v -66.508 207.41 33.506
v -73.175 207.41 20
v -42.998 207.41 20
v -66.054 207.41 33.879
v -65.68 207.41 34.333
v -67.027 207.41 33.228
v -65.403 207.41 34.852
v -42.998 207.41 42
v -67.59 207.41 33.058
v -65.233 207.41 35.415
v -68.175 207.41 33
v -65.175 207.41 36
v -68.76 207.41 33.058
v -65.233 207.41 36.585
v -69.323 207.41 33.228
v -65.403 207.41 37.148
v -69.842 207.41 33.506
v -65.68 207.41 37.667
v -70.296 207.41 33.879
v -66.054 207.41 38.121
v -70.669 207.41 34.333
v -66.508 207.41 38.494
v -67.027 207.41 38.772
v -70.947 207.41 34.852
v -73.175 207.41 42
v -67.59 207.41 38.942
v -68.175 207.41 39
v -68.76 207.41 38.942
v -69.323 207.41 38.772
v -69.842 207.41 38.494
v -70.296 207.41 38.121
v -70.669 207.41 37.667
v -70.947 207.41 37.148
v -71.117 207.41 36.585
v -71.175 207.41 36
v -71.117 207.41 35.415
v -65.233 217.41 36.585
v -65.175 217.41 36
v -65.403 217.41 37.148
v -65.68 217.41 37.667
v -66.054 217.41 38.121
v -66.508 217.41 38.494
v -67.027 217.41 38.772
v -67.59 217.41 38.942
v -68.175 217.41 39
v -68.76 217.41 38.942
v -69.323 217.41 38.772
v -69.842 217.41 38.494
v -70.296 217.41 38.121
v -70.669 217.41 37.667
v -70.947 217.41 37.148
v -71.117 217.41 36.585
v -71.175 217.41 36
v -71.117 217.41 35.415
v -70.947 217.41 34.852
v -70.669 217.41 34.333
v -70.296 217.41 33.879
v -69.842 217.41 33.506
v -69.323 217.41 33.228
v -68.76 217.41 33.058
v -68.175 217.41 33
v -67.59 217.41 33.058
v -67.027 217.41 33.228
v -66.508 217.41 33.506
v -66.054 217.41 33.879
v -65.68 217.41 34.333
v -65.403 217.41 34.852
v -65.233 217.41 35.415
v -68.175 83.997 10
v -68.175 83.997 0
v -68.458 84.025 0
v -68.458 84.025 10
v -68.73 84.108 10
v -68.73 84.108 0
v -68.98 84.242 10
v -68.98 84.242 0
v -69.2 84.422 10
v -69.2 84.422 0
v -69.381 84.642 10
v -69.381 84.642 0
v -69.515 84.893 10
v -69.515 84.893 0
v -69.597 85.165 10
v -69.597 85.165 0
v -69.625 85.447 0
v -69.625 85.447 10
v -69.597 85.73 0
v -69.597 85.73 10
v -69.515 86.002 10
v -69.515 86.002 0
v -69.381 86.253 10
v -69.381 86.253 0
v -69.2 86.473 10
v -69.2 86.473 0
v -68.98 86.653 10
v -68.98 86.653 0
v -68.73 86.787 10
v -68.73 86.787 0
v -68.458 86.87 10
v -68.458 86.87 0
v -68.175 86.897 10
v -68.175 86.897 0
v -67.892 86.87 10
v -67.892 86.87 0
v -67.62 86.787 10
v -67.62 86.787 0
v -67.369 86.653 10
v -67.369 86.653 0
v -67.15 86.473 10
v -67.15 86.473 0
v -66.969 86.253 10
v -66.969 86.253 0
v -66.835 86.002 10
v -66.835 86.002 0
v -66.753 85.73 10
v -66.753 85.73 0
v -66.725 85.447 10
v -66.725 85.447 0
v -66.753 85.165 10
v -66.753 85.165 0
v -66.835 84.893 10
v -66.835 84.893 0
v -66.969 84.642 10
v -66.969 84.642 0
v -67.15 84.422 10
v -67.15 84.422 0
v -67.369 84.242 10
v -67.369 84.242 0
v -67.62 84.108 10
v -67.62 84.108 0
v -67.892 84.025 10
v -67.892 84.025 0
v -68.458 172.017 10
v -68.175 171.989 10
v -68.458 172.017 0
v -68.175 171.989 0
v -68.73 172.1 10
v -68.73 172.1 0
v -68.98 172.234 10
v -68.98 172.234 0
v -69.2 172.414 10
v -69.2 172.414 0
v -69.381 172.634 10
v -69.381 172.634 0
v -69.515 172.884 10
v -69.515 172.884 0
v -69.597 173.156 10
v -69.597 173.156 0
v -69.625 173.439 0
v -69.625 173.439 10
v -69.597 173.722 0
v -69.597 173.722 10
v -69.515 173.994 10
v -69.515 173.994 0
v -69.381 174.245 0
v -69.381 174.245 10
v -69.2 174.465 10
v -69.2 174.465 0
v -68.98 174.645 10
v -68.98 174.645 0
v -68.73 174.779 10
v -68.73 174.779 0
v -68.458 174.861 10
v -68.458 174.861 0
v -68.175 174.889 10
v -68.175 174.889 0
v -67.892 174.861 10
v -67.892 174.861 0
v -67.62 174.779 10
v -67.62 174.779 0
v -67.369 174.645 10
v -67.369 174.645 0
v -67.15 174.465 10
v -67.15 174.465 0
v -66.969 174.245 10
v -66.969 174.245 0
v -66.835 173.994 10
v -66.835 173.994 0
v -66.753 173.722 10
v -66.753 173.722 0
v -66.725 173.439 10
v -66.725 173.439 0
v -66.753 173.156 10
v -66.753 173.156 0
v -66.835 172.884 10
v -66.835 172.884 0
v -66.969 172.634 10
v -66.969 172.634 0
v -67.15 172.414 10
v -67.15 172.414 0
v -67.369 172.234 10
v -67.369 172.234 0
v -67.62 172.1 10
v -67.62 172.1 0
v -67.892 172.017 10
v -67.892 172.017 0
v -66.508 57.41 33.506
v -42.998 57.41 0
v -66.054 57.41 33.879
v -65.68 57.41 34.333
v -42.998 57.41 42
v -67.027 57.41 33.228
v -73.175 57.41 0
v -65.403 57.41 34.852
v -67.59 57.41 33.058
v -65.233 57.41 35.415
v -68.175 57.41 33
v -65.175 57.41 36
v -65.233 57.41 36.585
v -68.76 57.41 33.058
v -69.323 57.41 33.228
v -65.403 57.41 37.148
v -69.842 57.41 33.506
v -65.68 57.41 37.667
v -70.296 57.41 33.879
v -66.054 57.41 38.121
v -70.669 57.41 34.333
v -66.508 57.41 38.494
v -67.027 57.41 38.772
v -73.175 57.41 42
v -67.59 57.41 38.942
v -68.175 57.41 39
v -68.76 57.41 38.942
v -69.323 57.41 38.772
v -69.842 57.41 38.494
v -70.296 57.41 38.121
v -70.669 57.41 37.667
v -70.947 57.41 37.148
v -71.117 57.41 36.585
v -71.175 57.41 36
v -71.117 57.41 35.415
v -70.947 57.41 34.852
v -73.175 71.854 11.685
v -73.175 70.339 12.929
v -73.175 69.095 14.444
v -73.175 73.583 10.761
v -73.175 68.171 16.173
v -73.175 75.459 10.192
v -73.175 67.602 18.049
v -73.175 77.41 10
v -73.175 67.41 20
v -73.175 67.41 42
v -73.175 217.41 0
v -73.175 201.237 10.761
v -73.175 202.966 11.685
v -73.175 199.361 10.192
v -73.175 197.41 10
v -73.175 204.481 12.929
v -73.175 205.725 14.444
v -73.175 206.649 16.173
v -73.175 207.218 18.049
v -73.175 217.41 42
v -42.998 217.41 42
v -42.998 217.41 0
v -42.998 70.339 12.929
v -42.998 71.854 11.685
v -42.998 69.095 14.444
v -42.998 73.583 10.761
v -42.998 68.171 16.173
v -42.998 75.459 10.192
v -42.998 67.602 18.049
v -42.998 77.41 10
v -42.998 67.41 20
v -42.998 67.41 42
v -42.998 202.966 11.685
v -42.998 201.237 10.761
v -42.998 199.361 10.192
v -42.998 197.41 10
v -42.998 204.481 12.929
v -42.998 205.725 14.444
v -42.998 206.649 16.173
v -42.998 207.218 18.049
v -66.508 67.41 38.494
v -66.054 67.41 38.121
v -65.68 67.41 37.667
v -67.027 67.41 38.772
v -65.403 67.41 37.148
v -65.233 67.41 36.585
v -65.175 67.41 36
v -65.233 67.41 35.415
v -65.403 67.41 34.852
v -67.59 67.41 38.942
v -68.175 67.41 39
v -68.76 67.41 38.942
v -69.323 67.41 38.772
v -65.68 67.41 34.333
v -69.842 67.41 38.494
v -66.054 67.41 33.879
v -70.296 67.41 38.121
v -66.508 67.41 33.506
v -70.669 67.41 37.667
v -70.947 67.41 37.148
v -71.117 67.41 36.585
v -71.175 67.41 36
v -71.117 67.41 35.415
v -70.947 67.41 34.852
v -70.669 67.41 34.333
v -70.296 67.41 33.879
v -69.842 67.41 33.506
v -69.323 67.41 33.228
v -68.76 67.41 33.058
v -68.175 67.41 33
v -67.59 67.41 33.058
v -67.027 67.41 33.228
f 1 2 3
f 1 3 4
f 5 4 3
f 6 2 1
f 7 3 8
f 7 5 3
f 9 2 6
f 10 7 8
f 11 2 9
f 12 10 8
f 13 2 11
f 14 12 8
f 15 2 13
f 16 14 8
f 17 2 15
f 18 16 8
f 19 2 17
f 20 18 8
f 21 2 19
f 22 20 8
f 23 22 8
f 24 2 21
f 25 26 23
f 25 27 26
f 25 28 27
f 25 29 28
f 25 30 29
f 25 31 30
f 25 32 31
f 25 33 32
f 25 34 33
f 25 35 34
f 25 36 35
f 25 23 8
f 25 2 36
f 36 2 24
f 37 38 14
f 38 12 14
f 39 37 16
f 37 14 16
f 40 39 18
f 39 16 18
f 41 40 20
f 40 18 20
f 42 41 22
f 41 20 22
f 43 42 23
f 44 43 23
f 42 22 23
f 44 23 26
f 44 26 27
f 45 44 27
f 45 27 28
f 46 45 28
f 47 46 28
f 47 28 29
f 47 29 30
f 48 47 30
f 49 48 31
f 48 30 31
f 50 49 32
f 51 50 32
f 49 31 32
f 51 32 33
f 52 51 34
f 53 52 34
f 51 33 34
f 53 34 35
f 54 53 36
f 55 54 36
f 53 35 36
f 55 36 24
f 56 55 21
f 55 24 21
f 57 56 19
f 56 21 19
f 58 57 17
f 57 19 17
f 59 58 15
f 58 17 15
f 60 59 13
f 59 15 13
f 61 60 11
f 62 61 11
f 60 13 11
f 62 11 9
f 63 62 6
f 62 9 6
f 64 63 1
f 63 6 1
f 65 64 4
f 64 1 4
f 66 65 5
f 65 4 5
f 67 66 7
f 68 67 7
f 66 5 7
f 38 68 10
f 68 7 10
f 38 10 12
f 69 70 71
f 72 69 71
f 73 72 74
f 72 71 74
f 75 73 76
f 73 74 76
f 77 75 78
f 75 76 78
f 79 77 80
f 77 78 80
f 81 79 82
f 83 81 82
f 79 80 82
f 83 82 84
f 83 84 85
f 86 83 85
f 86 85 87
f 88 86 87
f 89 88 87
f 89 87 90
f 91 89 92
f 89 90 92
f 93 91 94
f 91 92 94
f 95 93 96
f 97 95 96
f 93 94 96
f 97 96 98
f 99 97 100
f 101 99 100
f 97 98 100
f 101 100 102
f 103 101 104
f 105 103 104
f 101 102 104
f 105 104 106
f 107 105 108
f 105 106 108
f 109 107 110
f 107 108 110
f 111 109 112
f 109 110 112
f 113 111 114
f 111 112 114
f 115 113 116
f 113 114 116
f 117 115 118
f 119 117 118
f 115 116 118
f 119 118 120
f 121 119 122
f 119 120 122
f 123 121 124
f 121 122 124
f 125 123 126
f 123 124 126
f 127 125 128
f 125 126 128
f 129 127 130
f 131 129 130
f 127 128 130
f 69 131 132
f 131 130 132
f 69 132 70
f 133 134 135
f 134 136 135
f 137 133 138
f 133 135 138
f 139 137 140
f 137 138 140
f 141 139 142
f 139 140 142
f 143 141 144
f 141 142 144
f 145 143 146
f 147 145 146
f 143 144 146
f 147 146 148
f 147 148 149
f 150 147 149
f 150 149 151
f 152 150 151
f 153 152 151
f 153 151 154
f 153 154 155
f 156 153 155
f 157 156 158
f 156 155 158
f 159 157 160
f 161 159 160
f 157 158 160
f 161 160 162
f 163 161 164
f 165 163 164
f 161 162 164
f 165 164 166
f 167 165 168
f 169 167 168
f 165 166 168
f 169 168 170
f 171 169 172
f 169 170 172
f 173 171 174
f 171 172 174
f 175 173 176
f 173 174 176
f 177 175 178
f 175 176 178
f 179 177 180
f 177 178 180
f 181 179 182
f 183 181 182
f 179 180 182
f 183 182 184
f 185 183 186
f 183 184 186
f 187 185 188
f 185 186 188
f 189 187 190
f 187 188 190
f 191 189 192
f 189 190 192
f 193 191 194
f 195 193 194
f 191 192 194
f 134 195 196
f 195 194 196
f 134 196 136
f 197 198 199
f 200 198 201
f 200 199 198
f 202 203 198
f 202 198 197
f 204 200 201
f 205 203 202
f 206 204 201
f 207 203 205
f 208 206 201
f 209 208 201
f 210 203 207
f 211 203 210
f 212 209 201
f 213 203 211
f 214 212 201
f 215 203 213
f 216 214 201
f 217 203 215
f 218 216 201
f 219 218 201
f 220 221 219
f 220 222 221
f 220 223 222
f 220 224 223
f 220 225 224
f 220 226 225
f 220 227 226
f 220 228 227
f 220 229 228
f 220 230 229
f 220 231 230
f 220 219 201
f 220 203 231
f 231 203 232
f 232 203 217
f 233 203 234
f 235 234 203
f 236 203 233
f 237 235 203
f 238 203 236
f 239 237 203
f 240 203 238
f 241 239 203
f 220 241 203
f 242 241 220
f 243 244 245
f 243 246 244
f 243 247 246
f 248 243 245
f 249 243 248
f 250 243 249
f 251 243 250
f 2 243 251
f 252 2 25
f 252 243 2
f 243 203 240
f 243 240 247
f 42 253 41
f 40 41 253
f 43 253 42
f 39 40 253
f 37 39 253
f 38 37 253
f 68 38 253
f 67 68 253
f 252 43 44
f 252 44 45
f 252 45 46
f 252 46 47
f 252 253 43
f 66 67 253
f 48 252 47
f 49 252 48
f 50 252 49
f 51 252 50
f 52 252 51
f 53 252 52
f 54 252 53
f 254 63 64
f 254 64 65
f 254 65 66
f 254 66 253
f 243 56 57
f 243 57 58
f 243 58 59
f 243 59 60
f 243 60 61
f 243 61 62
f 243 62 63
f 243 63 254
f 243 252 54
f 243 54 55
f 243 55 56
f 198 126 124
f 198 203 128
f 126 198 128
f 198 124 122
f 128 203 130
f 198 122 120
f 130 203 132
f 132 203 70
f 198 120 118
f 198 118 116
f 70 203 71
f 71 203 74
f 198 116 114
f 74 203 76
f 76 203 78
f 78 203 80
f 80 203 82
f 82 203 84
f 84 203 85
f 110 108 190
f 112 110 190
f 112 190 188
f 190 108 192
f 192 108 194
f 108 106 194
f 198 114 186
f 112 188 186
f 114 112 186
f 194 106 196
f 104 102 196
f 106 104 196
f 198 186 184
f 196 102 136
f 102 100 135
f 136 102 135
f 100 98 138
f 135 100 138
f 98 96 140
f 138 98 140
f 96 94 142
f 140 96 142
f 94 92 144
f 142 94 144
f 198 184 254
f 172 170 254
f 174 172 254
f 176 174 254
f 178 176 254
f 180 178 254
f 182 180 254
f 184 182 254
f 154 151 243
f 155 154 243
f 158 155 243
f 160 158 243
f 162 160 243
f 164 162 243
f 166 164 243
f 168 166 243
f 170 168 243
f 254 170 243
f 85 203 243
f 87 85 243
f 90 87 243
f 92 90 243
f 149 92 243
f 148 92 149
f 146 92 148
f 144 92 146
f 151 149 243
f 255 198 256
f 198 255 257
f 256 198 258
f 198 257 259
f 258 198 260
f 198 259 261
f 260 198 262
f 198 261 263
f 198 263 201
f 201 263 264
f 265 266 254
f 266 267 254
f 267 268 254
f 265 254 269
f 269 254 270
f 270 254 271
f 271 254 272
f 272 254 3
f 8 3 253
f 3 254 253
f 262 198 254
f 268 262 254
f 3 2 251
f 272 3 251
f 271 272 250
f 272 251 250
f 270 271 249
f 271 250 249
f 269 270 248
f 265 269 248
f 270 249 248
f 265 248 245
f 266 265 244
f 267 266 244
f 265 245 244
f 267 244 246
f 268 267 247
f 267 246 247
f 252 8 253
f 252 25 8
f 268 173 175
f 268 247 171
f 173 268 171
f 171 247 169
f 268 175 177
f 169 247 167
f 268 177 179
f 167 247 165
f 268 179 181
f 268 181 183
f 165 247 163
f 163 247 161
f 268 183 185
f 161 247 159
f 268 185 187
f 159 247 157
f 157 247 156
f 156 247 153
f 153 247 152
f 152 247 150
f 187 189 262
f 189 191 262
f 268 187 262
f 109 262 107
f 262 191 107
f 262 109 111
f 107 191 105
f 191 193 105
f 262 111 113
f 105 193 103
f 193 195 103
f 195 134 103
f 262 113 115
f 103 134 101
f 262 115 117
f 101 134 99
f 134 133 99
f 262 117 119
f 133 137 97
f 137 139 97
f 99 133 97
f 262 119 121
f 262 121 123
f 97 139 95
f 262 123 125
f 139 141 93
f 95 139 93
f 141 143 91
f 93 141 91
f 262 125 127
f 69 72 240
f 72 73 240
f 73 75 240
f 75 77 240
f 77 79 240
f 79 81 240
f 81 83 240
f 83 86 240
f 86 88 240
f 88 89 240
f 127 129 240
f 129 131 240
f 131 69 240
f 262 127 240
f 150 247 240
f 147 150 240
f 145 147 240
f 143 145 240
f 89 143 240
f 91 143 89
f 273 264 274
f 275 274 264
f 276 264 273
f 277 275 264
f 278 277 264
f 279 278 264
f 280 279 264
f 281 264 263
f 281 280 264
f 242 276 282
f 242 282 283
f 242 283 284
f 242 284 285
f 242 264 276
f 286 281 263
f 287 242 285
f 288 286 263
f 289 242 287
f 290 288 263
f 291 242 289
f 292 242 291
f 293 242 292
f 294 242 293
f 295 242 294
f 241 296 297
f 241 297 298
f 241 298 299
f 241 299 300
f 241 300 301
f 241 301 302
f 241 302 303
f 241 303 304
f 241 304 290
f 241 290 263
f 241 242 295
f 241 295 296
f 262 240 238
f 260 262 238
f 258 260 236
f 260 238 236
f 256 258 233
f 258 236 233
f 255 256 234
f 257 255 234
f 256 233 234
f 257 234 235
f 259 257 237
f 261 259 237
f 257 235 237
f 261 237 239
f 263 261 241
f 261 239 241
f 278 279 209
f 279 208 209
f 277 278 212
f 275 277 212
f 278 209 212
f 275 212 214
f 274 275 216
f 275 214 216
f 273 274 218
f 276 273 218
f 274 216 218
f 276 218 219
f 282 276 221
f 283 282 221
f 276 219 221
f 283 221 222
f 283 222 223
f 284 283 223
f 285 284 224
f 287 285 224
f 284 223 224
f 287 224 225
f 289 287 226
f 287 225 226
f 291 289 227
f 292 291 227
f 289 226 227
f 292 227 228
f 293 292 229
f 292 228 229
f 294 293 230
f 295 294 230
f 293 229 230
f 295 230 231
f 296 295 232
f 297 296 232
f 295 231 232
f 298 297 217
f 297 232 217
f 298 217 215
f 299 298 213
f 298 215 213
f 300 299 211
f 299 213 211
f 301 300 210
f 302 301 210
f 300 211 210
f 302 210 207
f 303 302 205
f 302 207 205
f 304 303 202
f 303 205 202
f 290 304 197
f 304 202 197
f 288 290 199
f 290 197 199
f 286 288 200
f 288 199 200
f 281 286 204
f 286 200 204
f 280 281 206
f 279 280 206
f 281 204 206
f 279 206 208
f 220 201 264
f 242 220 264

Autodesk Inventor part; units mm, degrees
ref_plane "YZ Plane" through (0, 0, 0) normal (1, 0, 0) x (0, 1, 0)
ref_plane "XZ Plane" through (0, 0, 0) normal (0, 1, 0) x (-1, 0, 0)
ref_plane "Work Plane1" through (-73.1749, 241, 50) normal (-1, 0, 0) x (0, 0, 1)
sketch "Sketch1" plane through (-73.1749, 241, 50) normal (-1, 0, 0) x (0, 0, 1)
  line L0 (-50, -231) -> (-64, -231) projected
  line L1 (-50, -231) -> (-50, -20) projected
  arc A0 (-40, -10) -> (-50, -20) centre (-40, -20) ccw projected
  line L2 (0, -10) -> (-40, -10) projected
  line L3 (0, 0) -> (0, -10) projected
  line L4 (-64, 0) -> (0, 0) projected
  line L5 (-64, 0) -> (-64, -231) projected
  circle A1 centre (-21.5, -69.8271) radius 4 construction
  line L6 (-11, -56.6947) -> (-11, -84.1618) construction
  line L7 (-8, -23.5901) -> (-50, -23.5901)
  line L8 (-50, -23.5901) -> (-50, -33.5901)
  line L9 (-30, -33.5901) -> (-8, -33.5901)
  line L10 (-8, -33.5901) -> (-8, -23.5901)
  line L11 (-50, -183.5901) -> (-8, -183.5901)
  line L12 (-8, -183.5901) -> (-8, -173.5901)
  line L13 (-8, -173.5901) -> (-30, -173.5901)
  line L14 (-50, -173.5901) -> (-50, -183.5901)
  line L15 (-50, -33.5901) -> (-40, -33.5901)
  line L16 (-40, -43.5901) -> (-40, -163.5901)
  line L17 (-40, -173.5901) -> (-50, -173.5901)
  line L18 (-50, -173.5901) -> (-50, -33.5901)
  arc A2 (-30, -33.5901) -> (-40, -43.5901) centre (-30, -43.5901) ccw
  arc A3 (-40, -163.5901) -> (-30, -173.5901) centre (-30, -163.5901) ccw
  point P0 (-50, -241)
  dimension "d0" = 10
  dimension "d1" = 10
  dimension "d2" = 42
  dimension "d3" = 10
  dimension "d4" = 140
  dimension "d5" = 10
  dimension "d18" = 0
ref_plane "Work Plane2" through (-42.9985, 19.9999, -14.0003) normal (1, 0, 0) x (0, 1, 0)
extrude "Extrusion1" add sketch "Sketch1" against normal up to surface (30.1764 mm away) contours L1 L7 L10 L9 A2 L16 A3 L13 L12 L11
sketch "Sketch2" plane through (-73.1749, 57.4099, 0) normal (0, -1, 0) x (1, 0, 0)
  line L0 (30.1764, 0) -> (30.1764, 42) projected
  line L1 (0, 42) -> (30.1764, 42) projected
  line L2 (0, 0) -> (0, 42) projected
  line L3 (0, 0) -> (30.1764, 0) projected
  circle A0 centre (5, 36) radius 3
  line L4 (0, 42) -> (30.1764, 42) projected
  point P0 (73.1749, 0)
  dimension "d8" = 6
  dimension "d19" = 6
extrude "Extrusion2" cut sketch "Sketch2" against normal through all contours A0
sketch "Sketch3" plane through (-73.1749, 77.4099, 10) normal (0, 0, 1) x (1, 0, 0)
  arc A0 (7, 91.7198) -> (7, 90.4353) centre (5.7, 91.0776) ccw projected
  circle A1 centre (5, 96.0295) radius 1.4 projected
  circle A2 centre (5, 8.0376) radius 1.4 projected
  point P0 (73.1749, -77.4099)
hole "Hole1" at (-68.1749, 173.4393, 10) at (-68.1749, 85.4474, 10) direction (0, 0, -1) diameter 2.9 end through all both
properties part number "15_Opentrons_Additional_Slide"
